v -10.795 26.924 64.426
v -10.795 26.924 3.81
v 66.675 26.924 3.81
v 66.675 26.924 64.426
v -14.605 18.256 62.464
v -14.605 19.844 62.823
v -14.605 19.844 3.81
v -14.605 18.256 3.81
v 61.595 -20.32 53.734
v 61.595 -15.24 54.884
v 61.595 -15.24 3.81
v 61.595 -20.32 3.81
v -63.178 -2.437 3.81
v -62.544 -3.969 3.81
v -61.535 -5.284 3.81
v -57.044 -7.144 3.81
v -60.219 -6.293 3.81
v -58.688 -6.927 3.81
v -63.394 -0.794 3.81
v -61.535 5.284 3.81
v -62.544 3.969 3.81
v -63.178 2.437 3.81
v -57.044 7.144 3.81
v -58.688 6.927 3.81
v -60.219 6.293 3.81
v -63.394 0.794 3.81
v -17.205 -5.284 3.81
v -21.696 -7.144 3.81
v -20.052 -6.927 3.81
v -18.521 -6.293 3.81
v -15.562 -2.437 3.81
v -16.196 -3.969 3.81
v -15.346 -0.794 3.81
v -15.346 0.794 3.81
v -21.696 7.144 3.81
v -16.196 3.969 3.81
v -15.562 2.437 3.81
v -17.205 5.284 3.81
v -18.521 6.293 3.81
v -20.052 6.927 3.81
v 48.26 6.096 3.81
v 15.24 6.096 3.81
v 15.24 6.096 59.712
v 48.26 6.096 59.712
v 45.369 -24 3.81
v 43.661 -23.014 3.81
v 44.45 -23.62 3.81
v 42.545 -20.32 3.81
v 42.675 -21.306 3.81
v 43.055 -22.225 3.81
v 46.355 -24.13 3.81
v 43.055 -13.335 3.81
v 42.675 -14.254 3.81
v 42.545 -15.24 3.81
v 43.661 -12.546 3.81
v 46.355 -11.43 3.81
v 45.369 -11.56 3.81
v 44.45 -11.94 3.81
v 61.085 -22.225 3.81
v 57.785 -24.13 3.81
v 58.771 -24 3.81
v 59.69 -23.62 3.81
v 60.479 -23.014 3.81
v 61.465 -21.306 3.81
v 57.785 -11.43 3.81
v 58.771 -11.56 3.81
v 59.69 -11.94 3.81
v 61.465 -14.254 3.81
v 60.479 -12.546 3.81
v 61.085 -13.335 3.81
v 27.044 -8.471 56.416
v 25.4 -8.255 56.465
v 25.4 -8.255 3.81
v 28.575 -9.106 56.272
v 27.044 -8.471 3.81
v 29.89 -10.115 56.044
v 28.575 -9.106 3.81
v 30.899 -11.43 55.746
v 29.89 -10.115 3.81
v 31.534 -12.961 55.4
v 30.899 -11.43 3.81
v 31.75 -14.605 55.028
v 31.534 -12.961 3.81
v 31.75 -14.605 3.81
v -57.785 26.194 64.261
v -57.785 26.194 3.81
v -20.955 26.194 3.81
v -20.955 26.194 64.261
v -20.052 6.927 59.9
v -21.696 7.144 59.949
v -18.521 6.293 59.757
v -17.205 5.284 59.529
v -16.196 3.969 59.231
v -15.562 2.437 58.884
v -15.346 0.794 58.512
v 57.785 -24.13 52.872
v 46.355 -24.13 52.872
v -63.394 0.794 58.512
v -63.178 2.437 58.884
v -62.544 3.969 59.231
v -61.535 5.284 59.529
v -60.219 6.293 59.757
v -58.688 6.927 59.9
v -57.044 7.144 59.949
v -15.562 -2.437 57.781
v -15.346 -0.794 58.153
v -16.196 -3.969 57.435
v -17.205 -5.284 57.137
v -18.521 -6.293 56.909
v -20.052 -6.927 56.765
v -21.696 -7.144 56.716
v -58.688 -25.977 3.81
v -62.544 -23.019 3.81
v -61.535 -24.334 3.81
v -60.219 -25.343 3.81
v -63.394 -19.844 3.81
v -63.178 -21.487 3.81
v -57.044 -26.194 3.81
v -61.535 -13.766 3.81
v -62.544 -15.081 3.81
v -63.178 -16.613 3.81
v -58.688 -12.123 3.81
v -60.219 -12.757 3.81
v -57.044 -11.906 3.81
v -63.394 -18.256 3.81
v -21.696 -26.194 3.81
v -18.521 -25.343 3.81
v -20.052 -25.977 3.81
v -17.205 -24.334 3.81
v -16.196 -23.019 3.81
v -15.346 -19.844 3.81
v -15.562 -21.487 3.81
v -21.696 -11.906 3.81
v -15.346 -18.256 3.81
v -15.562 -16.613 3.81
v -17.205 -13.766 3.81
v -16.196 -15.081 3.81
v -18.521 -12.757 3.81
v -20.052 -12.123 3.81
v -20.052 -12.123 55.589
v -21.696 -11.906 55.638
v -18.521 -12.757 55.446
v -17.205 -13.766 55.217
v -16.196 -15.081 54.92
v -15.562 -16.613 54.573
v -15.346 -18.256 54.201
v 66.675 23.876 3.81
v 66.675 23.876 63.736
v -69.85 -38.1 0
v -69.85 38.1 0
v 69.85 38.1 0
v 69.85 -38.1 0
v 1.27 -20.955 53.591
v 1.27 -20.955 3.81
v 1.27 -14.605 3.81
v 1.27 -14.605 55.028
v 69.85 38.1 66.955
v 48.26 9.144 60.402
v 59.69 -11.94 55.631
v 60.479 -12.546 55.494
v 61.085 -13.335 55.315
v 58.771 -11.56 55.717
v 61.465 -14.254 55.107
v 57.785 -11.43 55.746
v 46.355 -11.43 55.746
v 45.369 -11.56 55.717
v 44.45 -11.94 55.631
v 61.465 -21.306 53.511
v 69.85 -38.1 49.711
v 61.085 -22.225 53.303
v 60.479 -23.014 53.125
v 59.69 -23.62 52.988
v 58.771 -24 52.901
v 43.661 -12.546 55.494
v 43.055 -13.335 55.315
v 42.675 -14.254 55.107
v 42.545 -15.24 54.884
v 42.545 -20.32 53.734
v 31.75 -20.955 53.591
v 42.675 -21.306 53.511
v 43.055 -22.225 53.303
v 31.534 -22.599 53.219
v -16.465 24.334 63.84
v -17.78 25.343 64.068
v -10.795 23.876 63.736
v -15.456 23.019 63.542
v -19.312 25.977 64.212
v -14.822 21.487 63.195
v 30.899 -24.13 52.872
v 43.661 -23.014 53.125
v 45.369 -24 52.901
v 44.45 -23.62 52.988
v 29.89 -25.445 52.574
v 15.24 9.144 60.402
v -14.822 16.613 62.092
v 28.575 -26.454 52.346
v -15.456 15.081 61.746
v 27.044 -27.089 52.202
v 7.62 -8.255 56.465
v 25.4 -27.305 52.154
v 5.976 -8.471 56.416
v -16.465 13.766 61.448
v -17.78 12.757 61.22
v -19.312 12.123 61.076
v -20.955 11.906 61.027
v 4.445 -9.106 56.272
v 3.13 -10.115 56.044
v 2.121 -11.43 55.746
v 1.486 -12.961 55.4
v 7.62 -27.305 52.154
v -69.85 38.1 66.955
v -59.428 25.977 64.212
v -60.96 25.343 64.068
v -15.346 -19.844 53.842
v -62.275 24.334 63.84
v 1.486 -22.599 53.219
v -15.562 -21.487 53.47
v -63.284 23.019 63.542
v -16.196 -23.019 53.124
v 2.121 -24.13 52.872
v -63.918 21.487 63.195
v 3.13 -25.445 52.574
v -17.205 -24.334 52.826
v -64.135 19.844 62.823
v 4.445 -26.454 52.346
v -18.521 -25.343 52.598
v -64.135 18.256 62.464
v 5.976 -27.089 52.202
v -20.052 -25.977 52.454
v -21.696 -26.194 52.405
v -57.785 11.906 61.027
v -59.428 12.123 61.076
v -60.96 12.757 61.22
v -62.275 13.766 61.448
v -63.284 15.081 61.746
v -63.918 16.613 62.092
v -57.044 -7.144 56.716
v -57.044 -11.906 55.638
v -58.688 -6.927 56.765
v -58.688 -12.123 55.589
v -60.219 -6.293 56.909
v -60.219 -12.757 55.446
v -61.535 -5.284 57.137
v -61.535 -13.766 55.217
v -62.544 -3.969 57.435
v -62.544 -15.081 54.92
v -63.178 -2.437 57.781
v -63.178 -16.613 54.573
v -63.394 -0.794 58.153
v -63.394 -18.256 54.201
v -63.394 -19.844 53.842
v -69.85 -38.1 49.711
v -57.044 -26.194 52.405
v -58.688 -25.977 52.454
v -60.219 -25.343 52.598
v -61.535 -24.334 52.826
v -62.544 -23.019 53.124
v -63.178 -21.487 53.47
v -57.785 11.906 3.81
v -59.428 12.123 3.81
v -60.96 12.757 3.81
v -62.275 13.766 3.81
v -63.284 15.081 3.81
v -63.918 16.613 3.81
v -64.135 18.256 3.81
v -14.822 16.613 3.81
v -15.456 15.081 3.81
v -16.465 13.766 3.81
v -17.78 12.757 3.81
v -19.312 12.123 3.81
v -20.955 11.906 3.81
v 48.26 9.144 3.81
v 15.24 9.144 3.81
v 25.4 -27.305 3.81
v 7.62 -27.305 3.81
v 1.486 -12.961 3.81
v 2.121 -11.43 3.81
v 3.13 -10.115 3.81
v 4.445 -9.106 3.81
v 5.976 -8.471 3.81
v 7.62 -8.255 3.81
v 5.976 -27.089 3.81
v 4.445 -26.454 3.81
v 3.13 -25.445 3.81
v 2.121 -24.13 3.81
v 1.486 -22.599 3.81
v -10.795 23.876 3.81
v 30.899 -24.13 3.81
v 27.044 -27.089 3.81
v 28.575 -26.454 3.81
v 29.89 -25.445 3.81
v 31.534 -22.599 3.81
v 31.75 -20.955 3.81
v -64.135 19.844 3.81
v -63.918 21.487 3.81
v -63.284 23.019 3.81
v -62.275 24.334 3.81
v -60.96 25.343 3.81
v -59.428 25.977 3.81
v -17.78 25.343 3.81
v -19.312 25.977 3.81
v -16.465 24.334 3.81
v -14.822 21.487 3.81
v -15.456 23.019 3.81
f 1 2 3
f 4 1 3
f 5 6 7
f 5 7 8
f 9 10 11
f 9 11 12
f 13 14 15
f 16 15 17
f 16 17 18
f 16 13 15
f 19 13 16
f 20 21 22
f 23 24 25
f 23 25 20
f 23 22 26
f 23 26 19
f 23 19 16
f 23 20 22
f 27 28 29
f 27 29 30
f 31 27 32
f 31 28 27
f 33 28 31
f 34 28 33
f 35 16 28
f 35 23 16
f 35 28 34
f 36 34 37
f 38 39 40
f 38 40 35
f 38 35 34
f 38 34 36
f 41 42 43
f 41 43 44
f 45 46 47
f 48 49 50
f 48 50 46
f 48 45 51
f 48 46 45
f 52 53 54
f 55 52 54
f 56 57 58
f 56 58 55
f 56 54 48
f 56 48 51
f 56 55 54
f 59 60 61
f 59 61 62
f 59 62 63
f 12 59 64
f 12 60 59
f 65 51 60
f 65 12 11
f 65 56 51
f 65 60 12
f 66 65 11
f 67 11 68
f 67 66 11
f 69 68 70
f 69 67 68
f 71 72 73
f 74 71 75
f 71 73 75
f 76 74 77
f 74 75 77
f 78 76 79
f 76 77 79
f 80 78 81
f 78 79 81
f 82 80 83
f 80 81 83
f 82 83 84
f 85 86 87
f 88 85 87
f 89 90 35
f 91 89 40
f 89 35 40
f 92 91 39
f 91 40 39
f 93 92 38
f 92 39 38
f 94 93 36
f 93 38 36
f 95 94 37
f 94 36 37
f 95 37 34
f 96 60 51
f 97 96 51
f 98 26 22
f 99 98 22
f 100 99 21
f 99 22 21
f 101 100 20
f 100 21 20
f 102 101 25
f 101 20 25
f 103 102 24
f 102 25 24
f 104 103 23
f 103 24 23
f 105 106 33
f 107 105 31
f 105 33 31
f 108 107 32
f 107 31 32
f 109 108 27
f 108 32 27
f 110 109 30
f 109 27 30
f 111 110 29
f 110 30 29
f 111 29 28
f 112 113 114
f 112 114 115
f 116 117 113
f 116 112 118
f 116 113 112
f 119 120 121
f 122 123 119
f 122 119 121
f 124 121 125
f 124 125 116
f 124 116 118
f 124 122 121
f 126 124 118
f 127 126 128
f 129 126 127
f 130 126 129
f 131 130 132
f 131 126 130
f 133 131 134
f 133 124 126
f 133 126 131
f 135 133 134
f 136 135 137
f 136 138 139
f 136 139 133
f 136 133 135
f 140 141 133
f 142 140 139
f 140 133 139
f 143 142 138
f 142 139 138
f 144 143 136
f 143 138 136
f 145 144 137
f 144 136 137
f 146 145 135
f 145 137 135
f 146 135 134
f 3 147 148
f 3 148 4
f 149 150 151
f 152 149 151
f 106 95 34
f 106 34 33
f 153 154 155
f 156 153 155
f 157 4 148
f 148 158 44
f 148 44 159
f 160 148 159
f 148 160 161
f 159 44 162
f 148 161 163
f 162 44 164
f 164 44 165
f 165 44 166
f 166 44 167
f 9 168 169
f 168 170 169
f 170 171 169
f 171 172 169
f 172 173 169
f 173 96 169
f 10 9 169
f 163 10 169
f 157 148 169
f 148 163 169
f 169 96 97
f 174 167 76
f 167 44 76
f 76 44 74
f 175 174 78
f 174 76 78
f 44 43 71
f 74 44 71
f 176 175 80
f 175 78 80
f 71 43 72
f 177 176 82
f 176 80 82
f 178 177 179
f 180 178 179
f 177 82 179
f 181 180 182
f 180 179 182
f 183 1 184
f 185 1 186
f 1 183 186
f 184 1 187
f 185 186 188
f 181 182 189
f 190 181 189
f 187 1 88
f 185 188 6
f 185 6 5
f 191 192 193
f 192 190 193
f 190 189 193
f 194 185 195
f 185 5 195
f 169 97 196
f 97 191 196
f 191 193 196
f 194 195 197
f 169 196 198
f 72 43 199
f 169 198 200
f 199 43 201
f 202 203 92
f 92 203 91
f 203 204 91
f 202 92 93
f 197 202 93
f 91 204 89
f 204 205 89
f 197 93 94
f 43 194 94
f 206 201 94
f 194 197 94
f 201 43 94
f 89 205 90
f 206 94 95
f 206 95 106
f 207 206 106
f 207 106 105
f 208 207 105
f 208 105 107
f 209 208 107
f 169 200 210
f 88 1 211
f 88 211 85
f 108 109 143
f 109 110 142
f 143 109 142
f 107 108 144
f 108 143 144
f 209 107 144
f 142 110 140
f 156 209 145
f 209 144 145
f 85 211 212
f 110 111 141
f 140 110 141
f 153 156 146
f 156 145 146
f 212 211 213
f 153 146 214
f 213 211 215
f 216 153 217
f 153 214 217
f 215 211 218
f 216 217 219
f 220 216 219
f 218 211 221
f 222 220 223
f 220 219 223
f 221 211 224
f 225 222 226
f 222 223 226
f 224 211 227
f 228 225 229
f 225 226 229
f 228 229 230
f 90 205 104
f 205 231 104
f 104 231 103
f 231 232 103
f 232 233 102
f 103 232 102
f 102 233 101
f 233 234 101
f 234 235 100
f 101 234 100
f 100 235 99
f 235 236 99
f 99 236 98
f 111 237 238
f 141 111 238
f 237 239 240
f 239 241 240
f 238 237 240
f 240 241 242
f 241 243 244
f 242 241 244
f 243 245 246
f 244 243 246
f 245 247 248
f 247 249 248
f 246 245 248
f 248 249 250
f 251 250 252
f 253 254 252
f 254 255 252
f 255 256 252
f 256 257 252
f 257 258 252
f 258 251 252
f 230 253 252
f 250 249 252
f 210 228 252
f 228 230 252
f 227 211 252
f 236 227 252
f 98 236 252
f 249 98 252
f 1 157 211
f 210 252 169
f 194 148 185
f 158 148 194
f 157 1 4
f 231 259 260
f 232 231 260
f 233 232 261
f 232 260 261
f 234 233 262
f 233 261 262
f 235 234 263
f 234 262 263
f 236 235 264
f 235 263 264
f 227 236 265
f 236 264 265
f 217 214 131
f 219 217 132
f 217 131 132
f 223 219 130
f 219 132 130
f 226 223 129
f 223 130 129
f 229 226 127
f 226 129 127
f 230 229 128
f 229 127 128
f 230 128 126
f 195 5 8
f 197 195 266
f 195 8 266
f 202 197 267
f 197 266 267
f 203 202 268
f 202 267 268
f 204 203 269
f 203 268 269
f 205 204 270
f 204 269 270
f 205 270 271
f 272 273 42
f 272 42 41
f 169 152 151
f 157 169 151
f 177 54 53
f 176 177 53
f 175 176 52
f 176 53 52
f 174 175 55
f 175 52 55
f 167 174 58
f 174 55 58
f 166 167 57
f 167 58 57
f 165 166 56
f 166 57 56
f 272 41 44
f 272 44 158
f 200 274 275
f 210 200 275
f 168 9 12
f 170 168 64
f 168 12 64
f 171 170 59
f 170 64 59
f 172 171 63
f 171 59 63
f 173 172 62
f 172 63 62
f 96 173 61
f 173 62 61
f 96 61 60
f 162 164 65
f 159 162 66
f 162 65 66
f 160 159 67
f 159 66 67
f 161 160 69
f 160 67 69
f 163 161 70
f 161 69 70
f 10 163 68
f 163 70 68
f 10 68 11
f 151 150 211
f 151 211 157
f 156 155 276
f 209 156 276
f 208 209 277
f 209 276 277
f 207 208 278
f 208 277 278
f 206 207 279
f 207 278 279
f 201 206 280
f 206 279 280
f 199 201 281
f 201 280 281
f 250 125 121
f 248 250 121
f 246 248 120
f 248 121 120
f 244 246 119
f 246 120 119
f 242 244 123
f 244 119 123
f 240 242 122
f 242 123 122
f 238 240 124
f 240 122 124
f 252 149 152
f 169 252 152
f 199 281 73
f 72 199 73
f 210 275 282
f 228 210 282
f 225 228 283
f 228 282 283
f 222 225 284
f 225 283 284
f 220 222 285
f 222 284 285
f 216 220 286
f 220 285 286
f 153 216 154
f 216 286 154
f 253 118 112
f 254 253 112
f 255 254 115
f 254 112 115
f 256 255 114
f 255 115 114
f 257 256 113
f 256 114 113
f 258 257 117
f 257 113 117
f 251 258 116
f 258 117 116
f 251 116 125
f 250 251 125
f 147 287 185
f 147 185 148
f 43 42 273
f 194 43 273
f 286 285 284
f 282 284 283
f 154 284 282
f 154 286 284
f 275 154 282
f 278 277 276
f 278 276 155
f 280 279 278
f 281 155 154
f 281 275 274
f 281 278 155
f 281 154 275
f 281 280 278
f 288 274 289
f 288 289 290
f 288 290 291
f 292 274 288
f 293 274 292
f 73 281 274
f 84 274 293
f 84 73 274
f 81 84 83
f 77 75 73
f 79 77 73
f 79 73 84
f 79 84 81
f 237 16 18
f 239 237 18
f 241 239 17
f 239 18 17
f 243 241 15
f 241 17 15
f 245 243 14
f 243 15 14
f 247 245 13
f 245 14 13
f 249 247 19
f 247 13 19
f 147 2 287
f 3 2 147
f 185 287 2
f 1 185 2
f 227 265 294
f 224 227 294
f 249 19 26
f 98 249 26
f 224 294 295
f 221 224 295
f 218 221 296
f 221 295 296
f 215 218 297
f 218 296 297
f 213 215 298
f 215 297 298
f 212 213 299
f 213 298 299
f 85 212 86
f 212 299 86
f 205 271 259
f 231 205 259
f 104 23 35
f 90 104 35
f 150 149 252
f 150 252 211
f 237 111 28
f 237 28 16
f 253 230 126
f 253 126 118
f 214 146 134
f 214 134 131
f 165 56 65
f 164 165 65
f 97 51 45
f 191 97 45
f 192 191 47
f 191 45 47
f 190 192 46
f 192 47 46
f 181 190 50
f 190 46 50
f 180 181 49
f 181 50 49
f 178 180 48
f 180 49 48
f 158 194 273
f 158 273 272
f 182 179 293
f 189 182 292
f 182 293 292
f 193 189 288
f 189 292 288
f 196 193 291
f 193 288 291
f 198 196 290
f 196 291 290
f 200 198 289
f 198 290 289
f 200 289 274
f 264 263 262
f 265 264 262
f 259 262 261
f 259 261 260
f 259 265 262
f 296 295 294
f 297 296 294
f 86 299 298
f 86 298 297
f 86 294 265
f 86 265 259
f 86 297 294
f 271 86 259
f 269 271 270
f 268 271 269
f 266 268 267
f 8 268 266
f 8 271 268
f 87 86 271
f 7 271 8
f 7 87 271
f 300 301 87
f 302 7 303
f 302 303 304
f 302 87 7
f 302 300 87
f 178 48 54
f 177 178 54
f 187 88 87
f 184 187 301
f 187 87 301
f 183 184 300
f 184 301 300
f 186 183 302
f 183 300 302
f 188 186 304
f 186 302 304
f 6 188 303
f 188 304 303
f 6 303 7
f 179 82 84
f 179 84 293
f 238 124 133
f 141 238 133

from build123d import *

# Parameters (mm, degrees)
F0_W     = 139.7
F0_H     = 76.2
F0_W_2   = 33.02
F0_H_2   = 3.048
F0_W_3   = 77.47
F1_DEPTH = 76.2
F3_DEPTH = 3.81
F4_DEPTH = 139.701


with BuildPart() as f1:
    # F0 (on Top) → F1 (new body)
    with BuildSketch(Plane.XY):
        Rectangle(F0_W, F0_H)
        with BuildLine():
            ThreePointArc((-63.394407, -18.25625), (-61.534535, -13.766122), (-57.044407, -11.90625))
            Line((-57.044407, -11.90625), (-21.695593, -11.90625))
            ThreePointArc((-21.695593, -11.90625), (-17.205465, -13.766122), (-15.345593, -18.25625))
            Line((-15.345593, -18.25625), (-15.345593, -19.84375))
            ThreePointArc((-15.345593, -19.84375), (-17.205465, -24.333878), (-21.695593, -26.19375))
            Line((-21.695593, -26.19375), (-57.044407, -26.19375))
            ThreePointArc((-57.044407, -26.19375), (-61.534535, -24.333878), (-63.394407, -19.84375))
            Line((-63.394407, -19.84375), (-63.394407, -18.25625))
        make_face(mode=Mode.SUBTRACT)
        with BuildLine():
            ThreePointArc((1.27, -14.605), (3.129872, -10.114872), (7.62, -8.255))
            Line((7.62, -8.255), (25.4, -8.255))
            ThreePointArc((25.4, -8.255), (29.890128, -10.114872), (31.75, -14.605))
            Line((31.75, -14.605), (31.75, -20.955))
            ThreePointArc((31.75, -20.955), (29.890128, -25.445128), (25.4, -27.305))
            Line((25.4, -27.305), (7.62, -27.305))
            ThreePointArc((7.62, -27.305), (3.129872, -25.445128), (1.27, -20.955))
            Line((1.27, -20.955), (1.27, -14.605))
        make_face(mode=Mode.SUBTRACT)
        with BuildLine():
            ThreePointArc((42.545, -15.24), (43.660923, -12.545923), (46.355, -11.43))
            Line((46.355, -11.43), (57.785, -11.43))
            ThreePointArc((57.785, -11.43), (60.479077, -12.545923), (61.595, -15.24))
            Line((61.595, -15.24), (61.595, -20.32))
            ThreePointArc((61.595, -20.32), (60.479077, -23.014077), (57.785, -24.13))
            Line((57.785, -24.13), (46.355, -24.13))
            ThreePointArc((46.355, -24.13), (43.660923, -23.014077), (42.545, -20.32))
            Line((42.545, -20.32), (42.545, -15.24))
        make_face(mode=Mode.SUBTRACT)
        with BuildLine():
            ThreePointArc((-63.394407, 0.79375), (-61.534535, 5.283878), (-57.044407, 7.14375))
            Line((-57.044407, 7.14375), (-21.695593, 7.14375))
            ThreePointArc((-21.695593, 7.14375), (-17.205465, 5.283878), (-15.345593, 0.79375))
            Line((-15.345593, 0.79375), (-15.345593, -0.79375))
            ThreePointArc((-15.345593, -0.79375), (-17.205465, -5.283878), (-21.695593, -7.14375))
            Line((-21.695593, -7.14375), (-57.044407, -7.14375))
            ThreePointArc((-57.044407, -7.14375), (-61.534535, -5.283878), (-63.394407, -0.79375))
            Line((-63.394407, -0.79375), (-63.394407, 0.79375))
        make_face(mode=Mode.SUBTRACT)
        with BuildLine():
            ThreePointArc((-64.134793, 19.84375), (-62.274921, 24.333878), (-57.784793, 26.19375))
            Line((-57.784793, 26.19375), (-20.955207, 26.19375))
            ThreePointArc((-20.955207, 26.19375), (-16.465079, 24.333878), (-14.605207, 19.84375))
            Line((-14.605207, 19.84375), (-14.605207, 18.25625))
            ThreePointArc((-14.605207, 18.25625), (-16.465079, 13.766122), (-20.955207, 11.90625))
            Line((-20.955207, 11.90625), (-57.784793, 11.90625))
            ThreePointArc((-57.784793, 11.90625), (-62.274921, 13.766122), (-64.134793, 18.25625))
            Line((-64.134793, 18.25625), (-64.134793, 19.84375))
        make_face(mode=Mode.SUBTRACT)
        with Locations((31.75, 7.62)):
            Rectangle(F0_W_2, F0_H_2, mode=Mode.SUBTRACT)
        with Locations((27.94, 25.4)):
            Rectangle(F0_W_3, F0_H_2, mode=Mode.SUBTRACT)
    extrude(amount=F1_DEPTH)

    # F0 (on Top) → F3 (join)
    with BuildSketch(Plane.XY):
        with BuildLine():
            Line((-20.955207, 26.19375), (-57.784793, 26.19375))
            ThreePointArc((-57.784793, 26.19375), (-62.274921, 24.333878), (-64.134793, 19.84375))
            Line((-64.134793, 19.84375), (-64.134793, 18.25625))
            ThreePointArc((-64.134793, 18.25625), (-62.274921, 13.766122), (-57.784793, 11.90625))
            Line((-57.784793, 11.90625), (-20.955207, 11.90625))
            ThreePointArc((-20.955207, 11.90625), (-16.465079, 13.766122), (-14.605207, 18.25625))
            Line((-14.605207, 18.25625), (-14.605207, 19.84375))
            ThreePointArc((-14.605207, 19.84375), (-16.465079, 24.333878), (-20.955207, 26.19375))
        make_face()
        with BuildLine():
            Line((-21.695593, 7.14375), (-57.044407, 7.14375))
            ThreePointArc((-57.044407, 7.14375), (-61.534535, 5.283878), (-63.394407, 0.79375))
            Line((-63.394407, 0.79375), (-63.394407, -0.79375))
            ThreePointArc((-63.394407, -0.79375), (-61.534535, -5.283878), (-57.044407, -7.14375))
            Line((-57.044407, -7.14375), (-21.695593, -7.14375))
            ThreePointArc((-21.695593, -7.14375), (-17.205465, -5.283878), (-15.345593, -0.79375))
            Line((-15.345593, -0.79375), (-15.345593, 0.79375))
            ThreePointArc((-15.345593, 0.79375), (-17.205465, 5.283878), (-21.695593, 7.14375))
        make_face()
        with BuildLine():
            Line((-21.695593, -11.90625), (-57.044407, -11.90625))
            ThreePointArc((-57.044407, -11.90625), (-61.534535, -13.766122), (-63.394407, -18.25625))
            Line((-63.394407, -18.25625), (-63.394407, -19.84375))
            ThreePointArc((-63.394407, -19.84375), (-61.534535, -24.333878), (-57.044407, -26.19375))
            Line((-57.044407, -26.19375), (-21.695593, -26.19375))
            ThreePointArc((-21.695593, -26.19375), (-17.205465, -24.333878), (-15.345593, -19.84375))
            Line((-15.345593, -19.84375), (-15.345593, -18.25625))
            ThreePointArc((-15.345593, -18.25625), (-17.205465, -13.766122), (-21.695593, -11.90625))
        make_face()
        with BuildLine():
            Line((25.4, -8.255), (7.62, -8.255))
            ThreePointArc((7.62, -8.255), (3.129872, -10.114872), (1.27, -14.605))
            Line((1.27, -14.605), (1.27, -20.955))
            ThreePointArc((1.27, -20.955), (3.129872, -25.445128), (7.62, -27.305))
            Line((7.62, -27.305), (25.4, -27.305))
            ThreePointArc((25.4, -27.305), (29.890128, -25.445128), (31.75, -20.955))
            Line((31.75, -20.955), (31.75, -14.605))
            ThreePointArc((31.75, -14.605), (29.890128, -10.114872), (25.4, -8.255))
        make_face()
        with BuildLine():
            Line((57.785, -11.43), (46.355, -11.43))
            ThreePointArc((46.355, -11.43), (43.660923, -12.545923), (42.545, -15.24))
            Line((42.545, -15.24), (42.545, -20.32))
            ThreePointArc((42.545, -20.32), (43.660923, -23.014077), (46.355, -24.13))
            Line((46.355, -24.13), (57.785, -24.13))
            ThreePointArc((57.785, -24.13), (60.479077, -23.014077), (61.595, -20.32))
            Line((61.595, -20.32), (61.595, -15.24))
            ThreePointArc((61.595, -15.24), (60.479077, -12.545923), (57.785, -11.43))
        make_face()
        with Locations((31.75, 7.62)):
            Rectangle(F0_W_2, F0_H_2)
        with Locations((27.94, 25.4)):
            Rectangle(F0_W_3, F0_H_2)
    extrude(amount=F3_DEPTH)

    # F2 (on face) → F4 (cut, through all)
    with BuildSketch(Plane(origin=(-69.85, 0, 0), x_dir=(0, -1, 0), z_dir=(-1, 0, 0))):
        Polygon((-38.1, 76.2), (-38.1, 66.954948), (38.1, 49.710575), (38.1, 76.2), align=None)
    extrude(amount=-F4_DEPTH, mode=Mode.SUBTRACT)


solid = f1.part
